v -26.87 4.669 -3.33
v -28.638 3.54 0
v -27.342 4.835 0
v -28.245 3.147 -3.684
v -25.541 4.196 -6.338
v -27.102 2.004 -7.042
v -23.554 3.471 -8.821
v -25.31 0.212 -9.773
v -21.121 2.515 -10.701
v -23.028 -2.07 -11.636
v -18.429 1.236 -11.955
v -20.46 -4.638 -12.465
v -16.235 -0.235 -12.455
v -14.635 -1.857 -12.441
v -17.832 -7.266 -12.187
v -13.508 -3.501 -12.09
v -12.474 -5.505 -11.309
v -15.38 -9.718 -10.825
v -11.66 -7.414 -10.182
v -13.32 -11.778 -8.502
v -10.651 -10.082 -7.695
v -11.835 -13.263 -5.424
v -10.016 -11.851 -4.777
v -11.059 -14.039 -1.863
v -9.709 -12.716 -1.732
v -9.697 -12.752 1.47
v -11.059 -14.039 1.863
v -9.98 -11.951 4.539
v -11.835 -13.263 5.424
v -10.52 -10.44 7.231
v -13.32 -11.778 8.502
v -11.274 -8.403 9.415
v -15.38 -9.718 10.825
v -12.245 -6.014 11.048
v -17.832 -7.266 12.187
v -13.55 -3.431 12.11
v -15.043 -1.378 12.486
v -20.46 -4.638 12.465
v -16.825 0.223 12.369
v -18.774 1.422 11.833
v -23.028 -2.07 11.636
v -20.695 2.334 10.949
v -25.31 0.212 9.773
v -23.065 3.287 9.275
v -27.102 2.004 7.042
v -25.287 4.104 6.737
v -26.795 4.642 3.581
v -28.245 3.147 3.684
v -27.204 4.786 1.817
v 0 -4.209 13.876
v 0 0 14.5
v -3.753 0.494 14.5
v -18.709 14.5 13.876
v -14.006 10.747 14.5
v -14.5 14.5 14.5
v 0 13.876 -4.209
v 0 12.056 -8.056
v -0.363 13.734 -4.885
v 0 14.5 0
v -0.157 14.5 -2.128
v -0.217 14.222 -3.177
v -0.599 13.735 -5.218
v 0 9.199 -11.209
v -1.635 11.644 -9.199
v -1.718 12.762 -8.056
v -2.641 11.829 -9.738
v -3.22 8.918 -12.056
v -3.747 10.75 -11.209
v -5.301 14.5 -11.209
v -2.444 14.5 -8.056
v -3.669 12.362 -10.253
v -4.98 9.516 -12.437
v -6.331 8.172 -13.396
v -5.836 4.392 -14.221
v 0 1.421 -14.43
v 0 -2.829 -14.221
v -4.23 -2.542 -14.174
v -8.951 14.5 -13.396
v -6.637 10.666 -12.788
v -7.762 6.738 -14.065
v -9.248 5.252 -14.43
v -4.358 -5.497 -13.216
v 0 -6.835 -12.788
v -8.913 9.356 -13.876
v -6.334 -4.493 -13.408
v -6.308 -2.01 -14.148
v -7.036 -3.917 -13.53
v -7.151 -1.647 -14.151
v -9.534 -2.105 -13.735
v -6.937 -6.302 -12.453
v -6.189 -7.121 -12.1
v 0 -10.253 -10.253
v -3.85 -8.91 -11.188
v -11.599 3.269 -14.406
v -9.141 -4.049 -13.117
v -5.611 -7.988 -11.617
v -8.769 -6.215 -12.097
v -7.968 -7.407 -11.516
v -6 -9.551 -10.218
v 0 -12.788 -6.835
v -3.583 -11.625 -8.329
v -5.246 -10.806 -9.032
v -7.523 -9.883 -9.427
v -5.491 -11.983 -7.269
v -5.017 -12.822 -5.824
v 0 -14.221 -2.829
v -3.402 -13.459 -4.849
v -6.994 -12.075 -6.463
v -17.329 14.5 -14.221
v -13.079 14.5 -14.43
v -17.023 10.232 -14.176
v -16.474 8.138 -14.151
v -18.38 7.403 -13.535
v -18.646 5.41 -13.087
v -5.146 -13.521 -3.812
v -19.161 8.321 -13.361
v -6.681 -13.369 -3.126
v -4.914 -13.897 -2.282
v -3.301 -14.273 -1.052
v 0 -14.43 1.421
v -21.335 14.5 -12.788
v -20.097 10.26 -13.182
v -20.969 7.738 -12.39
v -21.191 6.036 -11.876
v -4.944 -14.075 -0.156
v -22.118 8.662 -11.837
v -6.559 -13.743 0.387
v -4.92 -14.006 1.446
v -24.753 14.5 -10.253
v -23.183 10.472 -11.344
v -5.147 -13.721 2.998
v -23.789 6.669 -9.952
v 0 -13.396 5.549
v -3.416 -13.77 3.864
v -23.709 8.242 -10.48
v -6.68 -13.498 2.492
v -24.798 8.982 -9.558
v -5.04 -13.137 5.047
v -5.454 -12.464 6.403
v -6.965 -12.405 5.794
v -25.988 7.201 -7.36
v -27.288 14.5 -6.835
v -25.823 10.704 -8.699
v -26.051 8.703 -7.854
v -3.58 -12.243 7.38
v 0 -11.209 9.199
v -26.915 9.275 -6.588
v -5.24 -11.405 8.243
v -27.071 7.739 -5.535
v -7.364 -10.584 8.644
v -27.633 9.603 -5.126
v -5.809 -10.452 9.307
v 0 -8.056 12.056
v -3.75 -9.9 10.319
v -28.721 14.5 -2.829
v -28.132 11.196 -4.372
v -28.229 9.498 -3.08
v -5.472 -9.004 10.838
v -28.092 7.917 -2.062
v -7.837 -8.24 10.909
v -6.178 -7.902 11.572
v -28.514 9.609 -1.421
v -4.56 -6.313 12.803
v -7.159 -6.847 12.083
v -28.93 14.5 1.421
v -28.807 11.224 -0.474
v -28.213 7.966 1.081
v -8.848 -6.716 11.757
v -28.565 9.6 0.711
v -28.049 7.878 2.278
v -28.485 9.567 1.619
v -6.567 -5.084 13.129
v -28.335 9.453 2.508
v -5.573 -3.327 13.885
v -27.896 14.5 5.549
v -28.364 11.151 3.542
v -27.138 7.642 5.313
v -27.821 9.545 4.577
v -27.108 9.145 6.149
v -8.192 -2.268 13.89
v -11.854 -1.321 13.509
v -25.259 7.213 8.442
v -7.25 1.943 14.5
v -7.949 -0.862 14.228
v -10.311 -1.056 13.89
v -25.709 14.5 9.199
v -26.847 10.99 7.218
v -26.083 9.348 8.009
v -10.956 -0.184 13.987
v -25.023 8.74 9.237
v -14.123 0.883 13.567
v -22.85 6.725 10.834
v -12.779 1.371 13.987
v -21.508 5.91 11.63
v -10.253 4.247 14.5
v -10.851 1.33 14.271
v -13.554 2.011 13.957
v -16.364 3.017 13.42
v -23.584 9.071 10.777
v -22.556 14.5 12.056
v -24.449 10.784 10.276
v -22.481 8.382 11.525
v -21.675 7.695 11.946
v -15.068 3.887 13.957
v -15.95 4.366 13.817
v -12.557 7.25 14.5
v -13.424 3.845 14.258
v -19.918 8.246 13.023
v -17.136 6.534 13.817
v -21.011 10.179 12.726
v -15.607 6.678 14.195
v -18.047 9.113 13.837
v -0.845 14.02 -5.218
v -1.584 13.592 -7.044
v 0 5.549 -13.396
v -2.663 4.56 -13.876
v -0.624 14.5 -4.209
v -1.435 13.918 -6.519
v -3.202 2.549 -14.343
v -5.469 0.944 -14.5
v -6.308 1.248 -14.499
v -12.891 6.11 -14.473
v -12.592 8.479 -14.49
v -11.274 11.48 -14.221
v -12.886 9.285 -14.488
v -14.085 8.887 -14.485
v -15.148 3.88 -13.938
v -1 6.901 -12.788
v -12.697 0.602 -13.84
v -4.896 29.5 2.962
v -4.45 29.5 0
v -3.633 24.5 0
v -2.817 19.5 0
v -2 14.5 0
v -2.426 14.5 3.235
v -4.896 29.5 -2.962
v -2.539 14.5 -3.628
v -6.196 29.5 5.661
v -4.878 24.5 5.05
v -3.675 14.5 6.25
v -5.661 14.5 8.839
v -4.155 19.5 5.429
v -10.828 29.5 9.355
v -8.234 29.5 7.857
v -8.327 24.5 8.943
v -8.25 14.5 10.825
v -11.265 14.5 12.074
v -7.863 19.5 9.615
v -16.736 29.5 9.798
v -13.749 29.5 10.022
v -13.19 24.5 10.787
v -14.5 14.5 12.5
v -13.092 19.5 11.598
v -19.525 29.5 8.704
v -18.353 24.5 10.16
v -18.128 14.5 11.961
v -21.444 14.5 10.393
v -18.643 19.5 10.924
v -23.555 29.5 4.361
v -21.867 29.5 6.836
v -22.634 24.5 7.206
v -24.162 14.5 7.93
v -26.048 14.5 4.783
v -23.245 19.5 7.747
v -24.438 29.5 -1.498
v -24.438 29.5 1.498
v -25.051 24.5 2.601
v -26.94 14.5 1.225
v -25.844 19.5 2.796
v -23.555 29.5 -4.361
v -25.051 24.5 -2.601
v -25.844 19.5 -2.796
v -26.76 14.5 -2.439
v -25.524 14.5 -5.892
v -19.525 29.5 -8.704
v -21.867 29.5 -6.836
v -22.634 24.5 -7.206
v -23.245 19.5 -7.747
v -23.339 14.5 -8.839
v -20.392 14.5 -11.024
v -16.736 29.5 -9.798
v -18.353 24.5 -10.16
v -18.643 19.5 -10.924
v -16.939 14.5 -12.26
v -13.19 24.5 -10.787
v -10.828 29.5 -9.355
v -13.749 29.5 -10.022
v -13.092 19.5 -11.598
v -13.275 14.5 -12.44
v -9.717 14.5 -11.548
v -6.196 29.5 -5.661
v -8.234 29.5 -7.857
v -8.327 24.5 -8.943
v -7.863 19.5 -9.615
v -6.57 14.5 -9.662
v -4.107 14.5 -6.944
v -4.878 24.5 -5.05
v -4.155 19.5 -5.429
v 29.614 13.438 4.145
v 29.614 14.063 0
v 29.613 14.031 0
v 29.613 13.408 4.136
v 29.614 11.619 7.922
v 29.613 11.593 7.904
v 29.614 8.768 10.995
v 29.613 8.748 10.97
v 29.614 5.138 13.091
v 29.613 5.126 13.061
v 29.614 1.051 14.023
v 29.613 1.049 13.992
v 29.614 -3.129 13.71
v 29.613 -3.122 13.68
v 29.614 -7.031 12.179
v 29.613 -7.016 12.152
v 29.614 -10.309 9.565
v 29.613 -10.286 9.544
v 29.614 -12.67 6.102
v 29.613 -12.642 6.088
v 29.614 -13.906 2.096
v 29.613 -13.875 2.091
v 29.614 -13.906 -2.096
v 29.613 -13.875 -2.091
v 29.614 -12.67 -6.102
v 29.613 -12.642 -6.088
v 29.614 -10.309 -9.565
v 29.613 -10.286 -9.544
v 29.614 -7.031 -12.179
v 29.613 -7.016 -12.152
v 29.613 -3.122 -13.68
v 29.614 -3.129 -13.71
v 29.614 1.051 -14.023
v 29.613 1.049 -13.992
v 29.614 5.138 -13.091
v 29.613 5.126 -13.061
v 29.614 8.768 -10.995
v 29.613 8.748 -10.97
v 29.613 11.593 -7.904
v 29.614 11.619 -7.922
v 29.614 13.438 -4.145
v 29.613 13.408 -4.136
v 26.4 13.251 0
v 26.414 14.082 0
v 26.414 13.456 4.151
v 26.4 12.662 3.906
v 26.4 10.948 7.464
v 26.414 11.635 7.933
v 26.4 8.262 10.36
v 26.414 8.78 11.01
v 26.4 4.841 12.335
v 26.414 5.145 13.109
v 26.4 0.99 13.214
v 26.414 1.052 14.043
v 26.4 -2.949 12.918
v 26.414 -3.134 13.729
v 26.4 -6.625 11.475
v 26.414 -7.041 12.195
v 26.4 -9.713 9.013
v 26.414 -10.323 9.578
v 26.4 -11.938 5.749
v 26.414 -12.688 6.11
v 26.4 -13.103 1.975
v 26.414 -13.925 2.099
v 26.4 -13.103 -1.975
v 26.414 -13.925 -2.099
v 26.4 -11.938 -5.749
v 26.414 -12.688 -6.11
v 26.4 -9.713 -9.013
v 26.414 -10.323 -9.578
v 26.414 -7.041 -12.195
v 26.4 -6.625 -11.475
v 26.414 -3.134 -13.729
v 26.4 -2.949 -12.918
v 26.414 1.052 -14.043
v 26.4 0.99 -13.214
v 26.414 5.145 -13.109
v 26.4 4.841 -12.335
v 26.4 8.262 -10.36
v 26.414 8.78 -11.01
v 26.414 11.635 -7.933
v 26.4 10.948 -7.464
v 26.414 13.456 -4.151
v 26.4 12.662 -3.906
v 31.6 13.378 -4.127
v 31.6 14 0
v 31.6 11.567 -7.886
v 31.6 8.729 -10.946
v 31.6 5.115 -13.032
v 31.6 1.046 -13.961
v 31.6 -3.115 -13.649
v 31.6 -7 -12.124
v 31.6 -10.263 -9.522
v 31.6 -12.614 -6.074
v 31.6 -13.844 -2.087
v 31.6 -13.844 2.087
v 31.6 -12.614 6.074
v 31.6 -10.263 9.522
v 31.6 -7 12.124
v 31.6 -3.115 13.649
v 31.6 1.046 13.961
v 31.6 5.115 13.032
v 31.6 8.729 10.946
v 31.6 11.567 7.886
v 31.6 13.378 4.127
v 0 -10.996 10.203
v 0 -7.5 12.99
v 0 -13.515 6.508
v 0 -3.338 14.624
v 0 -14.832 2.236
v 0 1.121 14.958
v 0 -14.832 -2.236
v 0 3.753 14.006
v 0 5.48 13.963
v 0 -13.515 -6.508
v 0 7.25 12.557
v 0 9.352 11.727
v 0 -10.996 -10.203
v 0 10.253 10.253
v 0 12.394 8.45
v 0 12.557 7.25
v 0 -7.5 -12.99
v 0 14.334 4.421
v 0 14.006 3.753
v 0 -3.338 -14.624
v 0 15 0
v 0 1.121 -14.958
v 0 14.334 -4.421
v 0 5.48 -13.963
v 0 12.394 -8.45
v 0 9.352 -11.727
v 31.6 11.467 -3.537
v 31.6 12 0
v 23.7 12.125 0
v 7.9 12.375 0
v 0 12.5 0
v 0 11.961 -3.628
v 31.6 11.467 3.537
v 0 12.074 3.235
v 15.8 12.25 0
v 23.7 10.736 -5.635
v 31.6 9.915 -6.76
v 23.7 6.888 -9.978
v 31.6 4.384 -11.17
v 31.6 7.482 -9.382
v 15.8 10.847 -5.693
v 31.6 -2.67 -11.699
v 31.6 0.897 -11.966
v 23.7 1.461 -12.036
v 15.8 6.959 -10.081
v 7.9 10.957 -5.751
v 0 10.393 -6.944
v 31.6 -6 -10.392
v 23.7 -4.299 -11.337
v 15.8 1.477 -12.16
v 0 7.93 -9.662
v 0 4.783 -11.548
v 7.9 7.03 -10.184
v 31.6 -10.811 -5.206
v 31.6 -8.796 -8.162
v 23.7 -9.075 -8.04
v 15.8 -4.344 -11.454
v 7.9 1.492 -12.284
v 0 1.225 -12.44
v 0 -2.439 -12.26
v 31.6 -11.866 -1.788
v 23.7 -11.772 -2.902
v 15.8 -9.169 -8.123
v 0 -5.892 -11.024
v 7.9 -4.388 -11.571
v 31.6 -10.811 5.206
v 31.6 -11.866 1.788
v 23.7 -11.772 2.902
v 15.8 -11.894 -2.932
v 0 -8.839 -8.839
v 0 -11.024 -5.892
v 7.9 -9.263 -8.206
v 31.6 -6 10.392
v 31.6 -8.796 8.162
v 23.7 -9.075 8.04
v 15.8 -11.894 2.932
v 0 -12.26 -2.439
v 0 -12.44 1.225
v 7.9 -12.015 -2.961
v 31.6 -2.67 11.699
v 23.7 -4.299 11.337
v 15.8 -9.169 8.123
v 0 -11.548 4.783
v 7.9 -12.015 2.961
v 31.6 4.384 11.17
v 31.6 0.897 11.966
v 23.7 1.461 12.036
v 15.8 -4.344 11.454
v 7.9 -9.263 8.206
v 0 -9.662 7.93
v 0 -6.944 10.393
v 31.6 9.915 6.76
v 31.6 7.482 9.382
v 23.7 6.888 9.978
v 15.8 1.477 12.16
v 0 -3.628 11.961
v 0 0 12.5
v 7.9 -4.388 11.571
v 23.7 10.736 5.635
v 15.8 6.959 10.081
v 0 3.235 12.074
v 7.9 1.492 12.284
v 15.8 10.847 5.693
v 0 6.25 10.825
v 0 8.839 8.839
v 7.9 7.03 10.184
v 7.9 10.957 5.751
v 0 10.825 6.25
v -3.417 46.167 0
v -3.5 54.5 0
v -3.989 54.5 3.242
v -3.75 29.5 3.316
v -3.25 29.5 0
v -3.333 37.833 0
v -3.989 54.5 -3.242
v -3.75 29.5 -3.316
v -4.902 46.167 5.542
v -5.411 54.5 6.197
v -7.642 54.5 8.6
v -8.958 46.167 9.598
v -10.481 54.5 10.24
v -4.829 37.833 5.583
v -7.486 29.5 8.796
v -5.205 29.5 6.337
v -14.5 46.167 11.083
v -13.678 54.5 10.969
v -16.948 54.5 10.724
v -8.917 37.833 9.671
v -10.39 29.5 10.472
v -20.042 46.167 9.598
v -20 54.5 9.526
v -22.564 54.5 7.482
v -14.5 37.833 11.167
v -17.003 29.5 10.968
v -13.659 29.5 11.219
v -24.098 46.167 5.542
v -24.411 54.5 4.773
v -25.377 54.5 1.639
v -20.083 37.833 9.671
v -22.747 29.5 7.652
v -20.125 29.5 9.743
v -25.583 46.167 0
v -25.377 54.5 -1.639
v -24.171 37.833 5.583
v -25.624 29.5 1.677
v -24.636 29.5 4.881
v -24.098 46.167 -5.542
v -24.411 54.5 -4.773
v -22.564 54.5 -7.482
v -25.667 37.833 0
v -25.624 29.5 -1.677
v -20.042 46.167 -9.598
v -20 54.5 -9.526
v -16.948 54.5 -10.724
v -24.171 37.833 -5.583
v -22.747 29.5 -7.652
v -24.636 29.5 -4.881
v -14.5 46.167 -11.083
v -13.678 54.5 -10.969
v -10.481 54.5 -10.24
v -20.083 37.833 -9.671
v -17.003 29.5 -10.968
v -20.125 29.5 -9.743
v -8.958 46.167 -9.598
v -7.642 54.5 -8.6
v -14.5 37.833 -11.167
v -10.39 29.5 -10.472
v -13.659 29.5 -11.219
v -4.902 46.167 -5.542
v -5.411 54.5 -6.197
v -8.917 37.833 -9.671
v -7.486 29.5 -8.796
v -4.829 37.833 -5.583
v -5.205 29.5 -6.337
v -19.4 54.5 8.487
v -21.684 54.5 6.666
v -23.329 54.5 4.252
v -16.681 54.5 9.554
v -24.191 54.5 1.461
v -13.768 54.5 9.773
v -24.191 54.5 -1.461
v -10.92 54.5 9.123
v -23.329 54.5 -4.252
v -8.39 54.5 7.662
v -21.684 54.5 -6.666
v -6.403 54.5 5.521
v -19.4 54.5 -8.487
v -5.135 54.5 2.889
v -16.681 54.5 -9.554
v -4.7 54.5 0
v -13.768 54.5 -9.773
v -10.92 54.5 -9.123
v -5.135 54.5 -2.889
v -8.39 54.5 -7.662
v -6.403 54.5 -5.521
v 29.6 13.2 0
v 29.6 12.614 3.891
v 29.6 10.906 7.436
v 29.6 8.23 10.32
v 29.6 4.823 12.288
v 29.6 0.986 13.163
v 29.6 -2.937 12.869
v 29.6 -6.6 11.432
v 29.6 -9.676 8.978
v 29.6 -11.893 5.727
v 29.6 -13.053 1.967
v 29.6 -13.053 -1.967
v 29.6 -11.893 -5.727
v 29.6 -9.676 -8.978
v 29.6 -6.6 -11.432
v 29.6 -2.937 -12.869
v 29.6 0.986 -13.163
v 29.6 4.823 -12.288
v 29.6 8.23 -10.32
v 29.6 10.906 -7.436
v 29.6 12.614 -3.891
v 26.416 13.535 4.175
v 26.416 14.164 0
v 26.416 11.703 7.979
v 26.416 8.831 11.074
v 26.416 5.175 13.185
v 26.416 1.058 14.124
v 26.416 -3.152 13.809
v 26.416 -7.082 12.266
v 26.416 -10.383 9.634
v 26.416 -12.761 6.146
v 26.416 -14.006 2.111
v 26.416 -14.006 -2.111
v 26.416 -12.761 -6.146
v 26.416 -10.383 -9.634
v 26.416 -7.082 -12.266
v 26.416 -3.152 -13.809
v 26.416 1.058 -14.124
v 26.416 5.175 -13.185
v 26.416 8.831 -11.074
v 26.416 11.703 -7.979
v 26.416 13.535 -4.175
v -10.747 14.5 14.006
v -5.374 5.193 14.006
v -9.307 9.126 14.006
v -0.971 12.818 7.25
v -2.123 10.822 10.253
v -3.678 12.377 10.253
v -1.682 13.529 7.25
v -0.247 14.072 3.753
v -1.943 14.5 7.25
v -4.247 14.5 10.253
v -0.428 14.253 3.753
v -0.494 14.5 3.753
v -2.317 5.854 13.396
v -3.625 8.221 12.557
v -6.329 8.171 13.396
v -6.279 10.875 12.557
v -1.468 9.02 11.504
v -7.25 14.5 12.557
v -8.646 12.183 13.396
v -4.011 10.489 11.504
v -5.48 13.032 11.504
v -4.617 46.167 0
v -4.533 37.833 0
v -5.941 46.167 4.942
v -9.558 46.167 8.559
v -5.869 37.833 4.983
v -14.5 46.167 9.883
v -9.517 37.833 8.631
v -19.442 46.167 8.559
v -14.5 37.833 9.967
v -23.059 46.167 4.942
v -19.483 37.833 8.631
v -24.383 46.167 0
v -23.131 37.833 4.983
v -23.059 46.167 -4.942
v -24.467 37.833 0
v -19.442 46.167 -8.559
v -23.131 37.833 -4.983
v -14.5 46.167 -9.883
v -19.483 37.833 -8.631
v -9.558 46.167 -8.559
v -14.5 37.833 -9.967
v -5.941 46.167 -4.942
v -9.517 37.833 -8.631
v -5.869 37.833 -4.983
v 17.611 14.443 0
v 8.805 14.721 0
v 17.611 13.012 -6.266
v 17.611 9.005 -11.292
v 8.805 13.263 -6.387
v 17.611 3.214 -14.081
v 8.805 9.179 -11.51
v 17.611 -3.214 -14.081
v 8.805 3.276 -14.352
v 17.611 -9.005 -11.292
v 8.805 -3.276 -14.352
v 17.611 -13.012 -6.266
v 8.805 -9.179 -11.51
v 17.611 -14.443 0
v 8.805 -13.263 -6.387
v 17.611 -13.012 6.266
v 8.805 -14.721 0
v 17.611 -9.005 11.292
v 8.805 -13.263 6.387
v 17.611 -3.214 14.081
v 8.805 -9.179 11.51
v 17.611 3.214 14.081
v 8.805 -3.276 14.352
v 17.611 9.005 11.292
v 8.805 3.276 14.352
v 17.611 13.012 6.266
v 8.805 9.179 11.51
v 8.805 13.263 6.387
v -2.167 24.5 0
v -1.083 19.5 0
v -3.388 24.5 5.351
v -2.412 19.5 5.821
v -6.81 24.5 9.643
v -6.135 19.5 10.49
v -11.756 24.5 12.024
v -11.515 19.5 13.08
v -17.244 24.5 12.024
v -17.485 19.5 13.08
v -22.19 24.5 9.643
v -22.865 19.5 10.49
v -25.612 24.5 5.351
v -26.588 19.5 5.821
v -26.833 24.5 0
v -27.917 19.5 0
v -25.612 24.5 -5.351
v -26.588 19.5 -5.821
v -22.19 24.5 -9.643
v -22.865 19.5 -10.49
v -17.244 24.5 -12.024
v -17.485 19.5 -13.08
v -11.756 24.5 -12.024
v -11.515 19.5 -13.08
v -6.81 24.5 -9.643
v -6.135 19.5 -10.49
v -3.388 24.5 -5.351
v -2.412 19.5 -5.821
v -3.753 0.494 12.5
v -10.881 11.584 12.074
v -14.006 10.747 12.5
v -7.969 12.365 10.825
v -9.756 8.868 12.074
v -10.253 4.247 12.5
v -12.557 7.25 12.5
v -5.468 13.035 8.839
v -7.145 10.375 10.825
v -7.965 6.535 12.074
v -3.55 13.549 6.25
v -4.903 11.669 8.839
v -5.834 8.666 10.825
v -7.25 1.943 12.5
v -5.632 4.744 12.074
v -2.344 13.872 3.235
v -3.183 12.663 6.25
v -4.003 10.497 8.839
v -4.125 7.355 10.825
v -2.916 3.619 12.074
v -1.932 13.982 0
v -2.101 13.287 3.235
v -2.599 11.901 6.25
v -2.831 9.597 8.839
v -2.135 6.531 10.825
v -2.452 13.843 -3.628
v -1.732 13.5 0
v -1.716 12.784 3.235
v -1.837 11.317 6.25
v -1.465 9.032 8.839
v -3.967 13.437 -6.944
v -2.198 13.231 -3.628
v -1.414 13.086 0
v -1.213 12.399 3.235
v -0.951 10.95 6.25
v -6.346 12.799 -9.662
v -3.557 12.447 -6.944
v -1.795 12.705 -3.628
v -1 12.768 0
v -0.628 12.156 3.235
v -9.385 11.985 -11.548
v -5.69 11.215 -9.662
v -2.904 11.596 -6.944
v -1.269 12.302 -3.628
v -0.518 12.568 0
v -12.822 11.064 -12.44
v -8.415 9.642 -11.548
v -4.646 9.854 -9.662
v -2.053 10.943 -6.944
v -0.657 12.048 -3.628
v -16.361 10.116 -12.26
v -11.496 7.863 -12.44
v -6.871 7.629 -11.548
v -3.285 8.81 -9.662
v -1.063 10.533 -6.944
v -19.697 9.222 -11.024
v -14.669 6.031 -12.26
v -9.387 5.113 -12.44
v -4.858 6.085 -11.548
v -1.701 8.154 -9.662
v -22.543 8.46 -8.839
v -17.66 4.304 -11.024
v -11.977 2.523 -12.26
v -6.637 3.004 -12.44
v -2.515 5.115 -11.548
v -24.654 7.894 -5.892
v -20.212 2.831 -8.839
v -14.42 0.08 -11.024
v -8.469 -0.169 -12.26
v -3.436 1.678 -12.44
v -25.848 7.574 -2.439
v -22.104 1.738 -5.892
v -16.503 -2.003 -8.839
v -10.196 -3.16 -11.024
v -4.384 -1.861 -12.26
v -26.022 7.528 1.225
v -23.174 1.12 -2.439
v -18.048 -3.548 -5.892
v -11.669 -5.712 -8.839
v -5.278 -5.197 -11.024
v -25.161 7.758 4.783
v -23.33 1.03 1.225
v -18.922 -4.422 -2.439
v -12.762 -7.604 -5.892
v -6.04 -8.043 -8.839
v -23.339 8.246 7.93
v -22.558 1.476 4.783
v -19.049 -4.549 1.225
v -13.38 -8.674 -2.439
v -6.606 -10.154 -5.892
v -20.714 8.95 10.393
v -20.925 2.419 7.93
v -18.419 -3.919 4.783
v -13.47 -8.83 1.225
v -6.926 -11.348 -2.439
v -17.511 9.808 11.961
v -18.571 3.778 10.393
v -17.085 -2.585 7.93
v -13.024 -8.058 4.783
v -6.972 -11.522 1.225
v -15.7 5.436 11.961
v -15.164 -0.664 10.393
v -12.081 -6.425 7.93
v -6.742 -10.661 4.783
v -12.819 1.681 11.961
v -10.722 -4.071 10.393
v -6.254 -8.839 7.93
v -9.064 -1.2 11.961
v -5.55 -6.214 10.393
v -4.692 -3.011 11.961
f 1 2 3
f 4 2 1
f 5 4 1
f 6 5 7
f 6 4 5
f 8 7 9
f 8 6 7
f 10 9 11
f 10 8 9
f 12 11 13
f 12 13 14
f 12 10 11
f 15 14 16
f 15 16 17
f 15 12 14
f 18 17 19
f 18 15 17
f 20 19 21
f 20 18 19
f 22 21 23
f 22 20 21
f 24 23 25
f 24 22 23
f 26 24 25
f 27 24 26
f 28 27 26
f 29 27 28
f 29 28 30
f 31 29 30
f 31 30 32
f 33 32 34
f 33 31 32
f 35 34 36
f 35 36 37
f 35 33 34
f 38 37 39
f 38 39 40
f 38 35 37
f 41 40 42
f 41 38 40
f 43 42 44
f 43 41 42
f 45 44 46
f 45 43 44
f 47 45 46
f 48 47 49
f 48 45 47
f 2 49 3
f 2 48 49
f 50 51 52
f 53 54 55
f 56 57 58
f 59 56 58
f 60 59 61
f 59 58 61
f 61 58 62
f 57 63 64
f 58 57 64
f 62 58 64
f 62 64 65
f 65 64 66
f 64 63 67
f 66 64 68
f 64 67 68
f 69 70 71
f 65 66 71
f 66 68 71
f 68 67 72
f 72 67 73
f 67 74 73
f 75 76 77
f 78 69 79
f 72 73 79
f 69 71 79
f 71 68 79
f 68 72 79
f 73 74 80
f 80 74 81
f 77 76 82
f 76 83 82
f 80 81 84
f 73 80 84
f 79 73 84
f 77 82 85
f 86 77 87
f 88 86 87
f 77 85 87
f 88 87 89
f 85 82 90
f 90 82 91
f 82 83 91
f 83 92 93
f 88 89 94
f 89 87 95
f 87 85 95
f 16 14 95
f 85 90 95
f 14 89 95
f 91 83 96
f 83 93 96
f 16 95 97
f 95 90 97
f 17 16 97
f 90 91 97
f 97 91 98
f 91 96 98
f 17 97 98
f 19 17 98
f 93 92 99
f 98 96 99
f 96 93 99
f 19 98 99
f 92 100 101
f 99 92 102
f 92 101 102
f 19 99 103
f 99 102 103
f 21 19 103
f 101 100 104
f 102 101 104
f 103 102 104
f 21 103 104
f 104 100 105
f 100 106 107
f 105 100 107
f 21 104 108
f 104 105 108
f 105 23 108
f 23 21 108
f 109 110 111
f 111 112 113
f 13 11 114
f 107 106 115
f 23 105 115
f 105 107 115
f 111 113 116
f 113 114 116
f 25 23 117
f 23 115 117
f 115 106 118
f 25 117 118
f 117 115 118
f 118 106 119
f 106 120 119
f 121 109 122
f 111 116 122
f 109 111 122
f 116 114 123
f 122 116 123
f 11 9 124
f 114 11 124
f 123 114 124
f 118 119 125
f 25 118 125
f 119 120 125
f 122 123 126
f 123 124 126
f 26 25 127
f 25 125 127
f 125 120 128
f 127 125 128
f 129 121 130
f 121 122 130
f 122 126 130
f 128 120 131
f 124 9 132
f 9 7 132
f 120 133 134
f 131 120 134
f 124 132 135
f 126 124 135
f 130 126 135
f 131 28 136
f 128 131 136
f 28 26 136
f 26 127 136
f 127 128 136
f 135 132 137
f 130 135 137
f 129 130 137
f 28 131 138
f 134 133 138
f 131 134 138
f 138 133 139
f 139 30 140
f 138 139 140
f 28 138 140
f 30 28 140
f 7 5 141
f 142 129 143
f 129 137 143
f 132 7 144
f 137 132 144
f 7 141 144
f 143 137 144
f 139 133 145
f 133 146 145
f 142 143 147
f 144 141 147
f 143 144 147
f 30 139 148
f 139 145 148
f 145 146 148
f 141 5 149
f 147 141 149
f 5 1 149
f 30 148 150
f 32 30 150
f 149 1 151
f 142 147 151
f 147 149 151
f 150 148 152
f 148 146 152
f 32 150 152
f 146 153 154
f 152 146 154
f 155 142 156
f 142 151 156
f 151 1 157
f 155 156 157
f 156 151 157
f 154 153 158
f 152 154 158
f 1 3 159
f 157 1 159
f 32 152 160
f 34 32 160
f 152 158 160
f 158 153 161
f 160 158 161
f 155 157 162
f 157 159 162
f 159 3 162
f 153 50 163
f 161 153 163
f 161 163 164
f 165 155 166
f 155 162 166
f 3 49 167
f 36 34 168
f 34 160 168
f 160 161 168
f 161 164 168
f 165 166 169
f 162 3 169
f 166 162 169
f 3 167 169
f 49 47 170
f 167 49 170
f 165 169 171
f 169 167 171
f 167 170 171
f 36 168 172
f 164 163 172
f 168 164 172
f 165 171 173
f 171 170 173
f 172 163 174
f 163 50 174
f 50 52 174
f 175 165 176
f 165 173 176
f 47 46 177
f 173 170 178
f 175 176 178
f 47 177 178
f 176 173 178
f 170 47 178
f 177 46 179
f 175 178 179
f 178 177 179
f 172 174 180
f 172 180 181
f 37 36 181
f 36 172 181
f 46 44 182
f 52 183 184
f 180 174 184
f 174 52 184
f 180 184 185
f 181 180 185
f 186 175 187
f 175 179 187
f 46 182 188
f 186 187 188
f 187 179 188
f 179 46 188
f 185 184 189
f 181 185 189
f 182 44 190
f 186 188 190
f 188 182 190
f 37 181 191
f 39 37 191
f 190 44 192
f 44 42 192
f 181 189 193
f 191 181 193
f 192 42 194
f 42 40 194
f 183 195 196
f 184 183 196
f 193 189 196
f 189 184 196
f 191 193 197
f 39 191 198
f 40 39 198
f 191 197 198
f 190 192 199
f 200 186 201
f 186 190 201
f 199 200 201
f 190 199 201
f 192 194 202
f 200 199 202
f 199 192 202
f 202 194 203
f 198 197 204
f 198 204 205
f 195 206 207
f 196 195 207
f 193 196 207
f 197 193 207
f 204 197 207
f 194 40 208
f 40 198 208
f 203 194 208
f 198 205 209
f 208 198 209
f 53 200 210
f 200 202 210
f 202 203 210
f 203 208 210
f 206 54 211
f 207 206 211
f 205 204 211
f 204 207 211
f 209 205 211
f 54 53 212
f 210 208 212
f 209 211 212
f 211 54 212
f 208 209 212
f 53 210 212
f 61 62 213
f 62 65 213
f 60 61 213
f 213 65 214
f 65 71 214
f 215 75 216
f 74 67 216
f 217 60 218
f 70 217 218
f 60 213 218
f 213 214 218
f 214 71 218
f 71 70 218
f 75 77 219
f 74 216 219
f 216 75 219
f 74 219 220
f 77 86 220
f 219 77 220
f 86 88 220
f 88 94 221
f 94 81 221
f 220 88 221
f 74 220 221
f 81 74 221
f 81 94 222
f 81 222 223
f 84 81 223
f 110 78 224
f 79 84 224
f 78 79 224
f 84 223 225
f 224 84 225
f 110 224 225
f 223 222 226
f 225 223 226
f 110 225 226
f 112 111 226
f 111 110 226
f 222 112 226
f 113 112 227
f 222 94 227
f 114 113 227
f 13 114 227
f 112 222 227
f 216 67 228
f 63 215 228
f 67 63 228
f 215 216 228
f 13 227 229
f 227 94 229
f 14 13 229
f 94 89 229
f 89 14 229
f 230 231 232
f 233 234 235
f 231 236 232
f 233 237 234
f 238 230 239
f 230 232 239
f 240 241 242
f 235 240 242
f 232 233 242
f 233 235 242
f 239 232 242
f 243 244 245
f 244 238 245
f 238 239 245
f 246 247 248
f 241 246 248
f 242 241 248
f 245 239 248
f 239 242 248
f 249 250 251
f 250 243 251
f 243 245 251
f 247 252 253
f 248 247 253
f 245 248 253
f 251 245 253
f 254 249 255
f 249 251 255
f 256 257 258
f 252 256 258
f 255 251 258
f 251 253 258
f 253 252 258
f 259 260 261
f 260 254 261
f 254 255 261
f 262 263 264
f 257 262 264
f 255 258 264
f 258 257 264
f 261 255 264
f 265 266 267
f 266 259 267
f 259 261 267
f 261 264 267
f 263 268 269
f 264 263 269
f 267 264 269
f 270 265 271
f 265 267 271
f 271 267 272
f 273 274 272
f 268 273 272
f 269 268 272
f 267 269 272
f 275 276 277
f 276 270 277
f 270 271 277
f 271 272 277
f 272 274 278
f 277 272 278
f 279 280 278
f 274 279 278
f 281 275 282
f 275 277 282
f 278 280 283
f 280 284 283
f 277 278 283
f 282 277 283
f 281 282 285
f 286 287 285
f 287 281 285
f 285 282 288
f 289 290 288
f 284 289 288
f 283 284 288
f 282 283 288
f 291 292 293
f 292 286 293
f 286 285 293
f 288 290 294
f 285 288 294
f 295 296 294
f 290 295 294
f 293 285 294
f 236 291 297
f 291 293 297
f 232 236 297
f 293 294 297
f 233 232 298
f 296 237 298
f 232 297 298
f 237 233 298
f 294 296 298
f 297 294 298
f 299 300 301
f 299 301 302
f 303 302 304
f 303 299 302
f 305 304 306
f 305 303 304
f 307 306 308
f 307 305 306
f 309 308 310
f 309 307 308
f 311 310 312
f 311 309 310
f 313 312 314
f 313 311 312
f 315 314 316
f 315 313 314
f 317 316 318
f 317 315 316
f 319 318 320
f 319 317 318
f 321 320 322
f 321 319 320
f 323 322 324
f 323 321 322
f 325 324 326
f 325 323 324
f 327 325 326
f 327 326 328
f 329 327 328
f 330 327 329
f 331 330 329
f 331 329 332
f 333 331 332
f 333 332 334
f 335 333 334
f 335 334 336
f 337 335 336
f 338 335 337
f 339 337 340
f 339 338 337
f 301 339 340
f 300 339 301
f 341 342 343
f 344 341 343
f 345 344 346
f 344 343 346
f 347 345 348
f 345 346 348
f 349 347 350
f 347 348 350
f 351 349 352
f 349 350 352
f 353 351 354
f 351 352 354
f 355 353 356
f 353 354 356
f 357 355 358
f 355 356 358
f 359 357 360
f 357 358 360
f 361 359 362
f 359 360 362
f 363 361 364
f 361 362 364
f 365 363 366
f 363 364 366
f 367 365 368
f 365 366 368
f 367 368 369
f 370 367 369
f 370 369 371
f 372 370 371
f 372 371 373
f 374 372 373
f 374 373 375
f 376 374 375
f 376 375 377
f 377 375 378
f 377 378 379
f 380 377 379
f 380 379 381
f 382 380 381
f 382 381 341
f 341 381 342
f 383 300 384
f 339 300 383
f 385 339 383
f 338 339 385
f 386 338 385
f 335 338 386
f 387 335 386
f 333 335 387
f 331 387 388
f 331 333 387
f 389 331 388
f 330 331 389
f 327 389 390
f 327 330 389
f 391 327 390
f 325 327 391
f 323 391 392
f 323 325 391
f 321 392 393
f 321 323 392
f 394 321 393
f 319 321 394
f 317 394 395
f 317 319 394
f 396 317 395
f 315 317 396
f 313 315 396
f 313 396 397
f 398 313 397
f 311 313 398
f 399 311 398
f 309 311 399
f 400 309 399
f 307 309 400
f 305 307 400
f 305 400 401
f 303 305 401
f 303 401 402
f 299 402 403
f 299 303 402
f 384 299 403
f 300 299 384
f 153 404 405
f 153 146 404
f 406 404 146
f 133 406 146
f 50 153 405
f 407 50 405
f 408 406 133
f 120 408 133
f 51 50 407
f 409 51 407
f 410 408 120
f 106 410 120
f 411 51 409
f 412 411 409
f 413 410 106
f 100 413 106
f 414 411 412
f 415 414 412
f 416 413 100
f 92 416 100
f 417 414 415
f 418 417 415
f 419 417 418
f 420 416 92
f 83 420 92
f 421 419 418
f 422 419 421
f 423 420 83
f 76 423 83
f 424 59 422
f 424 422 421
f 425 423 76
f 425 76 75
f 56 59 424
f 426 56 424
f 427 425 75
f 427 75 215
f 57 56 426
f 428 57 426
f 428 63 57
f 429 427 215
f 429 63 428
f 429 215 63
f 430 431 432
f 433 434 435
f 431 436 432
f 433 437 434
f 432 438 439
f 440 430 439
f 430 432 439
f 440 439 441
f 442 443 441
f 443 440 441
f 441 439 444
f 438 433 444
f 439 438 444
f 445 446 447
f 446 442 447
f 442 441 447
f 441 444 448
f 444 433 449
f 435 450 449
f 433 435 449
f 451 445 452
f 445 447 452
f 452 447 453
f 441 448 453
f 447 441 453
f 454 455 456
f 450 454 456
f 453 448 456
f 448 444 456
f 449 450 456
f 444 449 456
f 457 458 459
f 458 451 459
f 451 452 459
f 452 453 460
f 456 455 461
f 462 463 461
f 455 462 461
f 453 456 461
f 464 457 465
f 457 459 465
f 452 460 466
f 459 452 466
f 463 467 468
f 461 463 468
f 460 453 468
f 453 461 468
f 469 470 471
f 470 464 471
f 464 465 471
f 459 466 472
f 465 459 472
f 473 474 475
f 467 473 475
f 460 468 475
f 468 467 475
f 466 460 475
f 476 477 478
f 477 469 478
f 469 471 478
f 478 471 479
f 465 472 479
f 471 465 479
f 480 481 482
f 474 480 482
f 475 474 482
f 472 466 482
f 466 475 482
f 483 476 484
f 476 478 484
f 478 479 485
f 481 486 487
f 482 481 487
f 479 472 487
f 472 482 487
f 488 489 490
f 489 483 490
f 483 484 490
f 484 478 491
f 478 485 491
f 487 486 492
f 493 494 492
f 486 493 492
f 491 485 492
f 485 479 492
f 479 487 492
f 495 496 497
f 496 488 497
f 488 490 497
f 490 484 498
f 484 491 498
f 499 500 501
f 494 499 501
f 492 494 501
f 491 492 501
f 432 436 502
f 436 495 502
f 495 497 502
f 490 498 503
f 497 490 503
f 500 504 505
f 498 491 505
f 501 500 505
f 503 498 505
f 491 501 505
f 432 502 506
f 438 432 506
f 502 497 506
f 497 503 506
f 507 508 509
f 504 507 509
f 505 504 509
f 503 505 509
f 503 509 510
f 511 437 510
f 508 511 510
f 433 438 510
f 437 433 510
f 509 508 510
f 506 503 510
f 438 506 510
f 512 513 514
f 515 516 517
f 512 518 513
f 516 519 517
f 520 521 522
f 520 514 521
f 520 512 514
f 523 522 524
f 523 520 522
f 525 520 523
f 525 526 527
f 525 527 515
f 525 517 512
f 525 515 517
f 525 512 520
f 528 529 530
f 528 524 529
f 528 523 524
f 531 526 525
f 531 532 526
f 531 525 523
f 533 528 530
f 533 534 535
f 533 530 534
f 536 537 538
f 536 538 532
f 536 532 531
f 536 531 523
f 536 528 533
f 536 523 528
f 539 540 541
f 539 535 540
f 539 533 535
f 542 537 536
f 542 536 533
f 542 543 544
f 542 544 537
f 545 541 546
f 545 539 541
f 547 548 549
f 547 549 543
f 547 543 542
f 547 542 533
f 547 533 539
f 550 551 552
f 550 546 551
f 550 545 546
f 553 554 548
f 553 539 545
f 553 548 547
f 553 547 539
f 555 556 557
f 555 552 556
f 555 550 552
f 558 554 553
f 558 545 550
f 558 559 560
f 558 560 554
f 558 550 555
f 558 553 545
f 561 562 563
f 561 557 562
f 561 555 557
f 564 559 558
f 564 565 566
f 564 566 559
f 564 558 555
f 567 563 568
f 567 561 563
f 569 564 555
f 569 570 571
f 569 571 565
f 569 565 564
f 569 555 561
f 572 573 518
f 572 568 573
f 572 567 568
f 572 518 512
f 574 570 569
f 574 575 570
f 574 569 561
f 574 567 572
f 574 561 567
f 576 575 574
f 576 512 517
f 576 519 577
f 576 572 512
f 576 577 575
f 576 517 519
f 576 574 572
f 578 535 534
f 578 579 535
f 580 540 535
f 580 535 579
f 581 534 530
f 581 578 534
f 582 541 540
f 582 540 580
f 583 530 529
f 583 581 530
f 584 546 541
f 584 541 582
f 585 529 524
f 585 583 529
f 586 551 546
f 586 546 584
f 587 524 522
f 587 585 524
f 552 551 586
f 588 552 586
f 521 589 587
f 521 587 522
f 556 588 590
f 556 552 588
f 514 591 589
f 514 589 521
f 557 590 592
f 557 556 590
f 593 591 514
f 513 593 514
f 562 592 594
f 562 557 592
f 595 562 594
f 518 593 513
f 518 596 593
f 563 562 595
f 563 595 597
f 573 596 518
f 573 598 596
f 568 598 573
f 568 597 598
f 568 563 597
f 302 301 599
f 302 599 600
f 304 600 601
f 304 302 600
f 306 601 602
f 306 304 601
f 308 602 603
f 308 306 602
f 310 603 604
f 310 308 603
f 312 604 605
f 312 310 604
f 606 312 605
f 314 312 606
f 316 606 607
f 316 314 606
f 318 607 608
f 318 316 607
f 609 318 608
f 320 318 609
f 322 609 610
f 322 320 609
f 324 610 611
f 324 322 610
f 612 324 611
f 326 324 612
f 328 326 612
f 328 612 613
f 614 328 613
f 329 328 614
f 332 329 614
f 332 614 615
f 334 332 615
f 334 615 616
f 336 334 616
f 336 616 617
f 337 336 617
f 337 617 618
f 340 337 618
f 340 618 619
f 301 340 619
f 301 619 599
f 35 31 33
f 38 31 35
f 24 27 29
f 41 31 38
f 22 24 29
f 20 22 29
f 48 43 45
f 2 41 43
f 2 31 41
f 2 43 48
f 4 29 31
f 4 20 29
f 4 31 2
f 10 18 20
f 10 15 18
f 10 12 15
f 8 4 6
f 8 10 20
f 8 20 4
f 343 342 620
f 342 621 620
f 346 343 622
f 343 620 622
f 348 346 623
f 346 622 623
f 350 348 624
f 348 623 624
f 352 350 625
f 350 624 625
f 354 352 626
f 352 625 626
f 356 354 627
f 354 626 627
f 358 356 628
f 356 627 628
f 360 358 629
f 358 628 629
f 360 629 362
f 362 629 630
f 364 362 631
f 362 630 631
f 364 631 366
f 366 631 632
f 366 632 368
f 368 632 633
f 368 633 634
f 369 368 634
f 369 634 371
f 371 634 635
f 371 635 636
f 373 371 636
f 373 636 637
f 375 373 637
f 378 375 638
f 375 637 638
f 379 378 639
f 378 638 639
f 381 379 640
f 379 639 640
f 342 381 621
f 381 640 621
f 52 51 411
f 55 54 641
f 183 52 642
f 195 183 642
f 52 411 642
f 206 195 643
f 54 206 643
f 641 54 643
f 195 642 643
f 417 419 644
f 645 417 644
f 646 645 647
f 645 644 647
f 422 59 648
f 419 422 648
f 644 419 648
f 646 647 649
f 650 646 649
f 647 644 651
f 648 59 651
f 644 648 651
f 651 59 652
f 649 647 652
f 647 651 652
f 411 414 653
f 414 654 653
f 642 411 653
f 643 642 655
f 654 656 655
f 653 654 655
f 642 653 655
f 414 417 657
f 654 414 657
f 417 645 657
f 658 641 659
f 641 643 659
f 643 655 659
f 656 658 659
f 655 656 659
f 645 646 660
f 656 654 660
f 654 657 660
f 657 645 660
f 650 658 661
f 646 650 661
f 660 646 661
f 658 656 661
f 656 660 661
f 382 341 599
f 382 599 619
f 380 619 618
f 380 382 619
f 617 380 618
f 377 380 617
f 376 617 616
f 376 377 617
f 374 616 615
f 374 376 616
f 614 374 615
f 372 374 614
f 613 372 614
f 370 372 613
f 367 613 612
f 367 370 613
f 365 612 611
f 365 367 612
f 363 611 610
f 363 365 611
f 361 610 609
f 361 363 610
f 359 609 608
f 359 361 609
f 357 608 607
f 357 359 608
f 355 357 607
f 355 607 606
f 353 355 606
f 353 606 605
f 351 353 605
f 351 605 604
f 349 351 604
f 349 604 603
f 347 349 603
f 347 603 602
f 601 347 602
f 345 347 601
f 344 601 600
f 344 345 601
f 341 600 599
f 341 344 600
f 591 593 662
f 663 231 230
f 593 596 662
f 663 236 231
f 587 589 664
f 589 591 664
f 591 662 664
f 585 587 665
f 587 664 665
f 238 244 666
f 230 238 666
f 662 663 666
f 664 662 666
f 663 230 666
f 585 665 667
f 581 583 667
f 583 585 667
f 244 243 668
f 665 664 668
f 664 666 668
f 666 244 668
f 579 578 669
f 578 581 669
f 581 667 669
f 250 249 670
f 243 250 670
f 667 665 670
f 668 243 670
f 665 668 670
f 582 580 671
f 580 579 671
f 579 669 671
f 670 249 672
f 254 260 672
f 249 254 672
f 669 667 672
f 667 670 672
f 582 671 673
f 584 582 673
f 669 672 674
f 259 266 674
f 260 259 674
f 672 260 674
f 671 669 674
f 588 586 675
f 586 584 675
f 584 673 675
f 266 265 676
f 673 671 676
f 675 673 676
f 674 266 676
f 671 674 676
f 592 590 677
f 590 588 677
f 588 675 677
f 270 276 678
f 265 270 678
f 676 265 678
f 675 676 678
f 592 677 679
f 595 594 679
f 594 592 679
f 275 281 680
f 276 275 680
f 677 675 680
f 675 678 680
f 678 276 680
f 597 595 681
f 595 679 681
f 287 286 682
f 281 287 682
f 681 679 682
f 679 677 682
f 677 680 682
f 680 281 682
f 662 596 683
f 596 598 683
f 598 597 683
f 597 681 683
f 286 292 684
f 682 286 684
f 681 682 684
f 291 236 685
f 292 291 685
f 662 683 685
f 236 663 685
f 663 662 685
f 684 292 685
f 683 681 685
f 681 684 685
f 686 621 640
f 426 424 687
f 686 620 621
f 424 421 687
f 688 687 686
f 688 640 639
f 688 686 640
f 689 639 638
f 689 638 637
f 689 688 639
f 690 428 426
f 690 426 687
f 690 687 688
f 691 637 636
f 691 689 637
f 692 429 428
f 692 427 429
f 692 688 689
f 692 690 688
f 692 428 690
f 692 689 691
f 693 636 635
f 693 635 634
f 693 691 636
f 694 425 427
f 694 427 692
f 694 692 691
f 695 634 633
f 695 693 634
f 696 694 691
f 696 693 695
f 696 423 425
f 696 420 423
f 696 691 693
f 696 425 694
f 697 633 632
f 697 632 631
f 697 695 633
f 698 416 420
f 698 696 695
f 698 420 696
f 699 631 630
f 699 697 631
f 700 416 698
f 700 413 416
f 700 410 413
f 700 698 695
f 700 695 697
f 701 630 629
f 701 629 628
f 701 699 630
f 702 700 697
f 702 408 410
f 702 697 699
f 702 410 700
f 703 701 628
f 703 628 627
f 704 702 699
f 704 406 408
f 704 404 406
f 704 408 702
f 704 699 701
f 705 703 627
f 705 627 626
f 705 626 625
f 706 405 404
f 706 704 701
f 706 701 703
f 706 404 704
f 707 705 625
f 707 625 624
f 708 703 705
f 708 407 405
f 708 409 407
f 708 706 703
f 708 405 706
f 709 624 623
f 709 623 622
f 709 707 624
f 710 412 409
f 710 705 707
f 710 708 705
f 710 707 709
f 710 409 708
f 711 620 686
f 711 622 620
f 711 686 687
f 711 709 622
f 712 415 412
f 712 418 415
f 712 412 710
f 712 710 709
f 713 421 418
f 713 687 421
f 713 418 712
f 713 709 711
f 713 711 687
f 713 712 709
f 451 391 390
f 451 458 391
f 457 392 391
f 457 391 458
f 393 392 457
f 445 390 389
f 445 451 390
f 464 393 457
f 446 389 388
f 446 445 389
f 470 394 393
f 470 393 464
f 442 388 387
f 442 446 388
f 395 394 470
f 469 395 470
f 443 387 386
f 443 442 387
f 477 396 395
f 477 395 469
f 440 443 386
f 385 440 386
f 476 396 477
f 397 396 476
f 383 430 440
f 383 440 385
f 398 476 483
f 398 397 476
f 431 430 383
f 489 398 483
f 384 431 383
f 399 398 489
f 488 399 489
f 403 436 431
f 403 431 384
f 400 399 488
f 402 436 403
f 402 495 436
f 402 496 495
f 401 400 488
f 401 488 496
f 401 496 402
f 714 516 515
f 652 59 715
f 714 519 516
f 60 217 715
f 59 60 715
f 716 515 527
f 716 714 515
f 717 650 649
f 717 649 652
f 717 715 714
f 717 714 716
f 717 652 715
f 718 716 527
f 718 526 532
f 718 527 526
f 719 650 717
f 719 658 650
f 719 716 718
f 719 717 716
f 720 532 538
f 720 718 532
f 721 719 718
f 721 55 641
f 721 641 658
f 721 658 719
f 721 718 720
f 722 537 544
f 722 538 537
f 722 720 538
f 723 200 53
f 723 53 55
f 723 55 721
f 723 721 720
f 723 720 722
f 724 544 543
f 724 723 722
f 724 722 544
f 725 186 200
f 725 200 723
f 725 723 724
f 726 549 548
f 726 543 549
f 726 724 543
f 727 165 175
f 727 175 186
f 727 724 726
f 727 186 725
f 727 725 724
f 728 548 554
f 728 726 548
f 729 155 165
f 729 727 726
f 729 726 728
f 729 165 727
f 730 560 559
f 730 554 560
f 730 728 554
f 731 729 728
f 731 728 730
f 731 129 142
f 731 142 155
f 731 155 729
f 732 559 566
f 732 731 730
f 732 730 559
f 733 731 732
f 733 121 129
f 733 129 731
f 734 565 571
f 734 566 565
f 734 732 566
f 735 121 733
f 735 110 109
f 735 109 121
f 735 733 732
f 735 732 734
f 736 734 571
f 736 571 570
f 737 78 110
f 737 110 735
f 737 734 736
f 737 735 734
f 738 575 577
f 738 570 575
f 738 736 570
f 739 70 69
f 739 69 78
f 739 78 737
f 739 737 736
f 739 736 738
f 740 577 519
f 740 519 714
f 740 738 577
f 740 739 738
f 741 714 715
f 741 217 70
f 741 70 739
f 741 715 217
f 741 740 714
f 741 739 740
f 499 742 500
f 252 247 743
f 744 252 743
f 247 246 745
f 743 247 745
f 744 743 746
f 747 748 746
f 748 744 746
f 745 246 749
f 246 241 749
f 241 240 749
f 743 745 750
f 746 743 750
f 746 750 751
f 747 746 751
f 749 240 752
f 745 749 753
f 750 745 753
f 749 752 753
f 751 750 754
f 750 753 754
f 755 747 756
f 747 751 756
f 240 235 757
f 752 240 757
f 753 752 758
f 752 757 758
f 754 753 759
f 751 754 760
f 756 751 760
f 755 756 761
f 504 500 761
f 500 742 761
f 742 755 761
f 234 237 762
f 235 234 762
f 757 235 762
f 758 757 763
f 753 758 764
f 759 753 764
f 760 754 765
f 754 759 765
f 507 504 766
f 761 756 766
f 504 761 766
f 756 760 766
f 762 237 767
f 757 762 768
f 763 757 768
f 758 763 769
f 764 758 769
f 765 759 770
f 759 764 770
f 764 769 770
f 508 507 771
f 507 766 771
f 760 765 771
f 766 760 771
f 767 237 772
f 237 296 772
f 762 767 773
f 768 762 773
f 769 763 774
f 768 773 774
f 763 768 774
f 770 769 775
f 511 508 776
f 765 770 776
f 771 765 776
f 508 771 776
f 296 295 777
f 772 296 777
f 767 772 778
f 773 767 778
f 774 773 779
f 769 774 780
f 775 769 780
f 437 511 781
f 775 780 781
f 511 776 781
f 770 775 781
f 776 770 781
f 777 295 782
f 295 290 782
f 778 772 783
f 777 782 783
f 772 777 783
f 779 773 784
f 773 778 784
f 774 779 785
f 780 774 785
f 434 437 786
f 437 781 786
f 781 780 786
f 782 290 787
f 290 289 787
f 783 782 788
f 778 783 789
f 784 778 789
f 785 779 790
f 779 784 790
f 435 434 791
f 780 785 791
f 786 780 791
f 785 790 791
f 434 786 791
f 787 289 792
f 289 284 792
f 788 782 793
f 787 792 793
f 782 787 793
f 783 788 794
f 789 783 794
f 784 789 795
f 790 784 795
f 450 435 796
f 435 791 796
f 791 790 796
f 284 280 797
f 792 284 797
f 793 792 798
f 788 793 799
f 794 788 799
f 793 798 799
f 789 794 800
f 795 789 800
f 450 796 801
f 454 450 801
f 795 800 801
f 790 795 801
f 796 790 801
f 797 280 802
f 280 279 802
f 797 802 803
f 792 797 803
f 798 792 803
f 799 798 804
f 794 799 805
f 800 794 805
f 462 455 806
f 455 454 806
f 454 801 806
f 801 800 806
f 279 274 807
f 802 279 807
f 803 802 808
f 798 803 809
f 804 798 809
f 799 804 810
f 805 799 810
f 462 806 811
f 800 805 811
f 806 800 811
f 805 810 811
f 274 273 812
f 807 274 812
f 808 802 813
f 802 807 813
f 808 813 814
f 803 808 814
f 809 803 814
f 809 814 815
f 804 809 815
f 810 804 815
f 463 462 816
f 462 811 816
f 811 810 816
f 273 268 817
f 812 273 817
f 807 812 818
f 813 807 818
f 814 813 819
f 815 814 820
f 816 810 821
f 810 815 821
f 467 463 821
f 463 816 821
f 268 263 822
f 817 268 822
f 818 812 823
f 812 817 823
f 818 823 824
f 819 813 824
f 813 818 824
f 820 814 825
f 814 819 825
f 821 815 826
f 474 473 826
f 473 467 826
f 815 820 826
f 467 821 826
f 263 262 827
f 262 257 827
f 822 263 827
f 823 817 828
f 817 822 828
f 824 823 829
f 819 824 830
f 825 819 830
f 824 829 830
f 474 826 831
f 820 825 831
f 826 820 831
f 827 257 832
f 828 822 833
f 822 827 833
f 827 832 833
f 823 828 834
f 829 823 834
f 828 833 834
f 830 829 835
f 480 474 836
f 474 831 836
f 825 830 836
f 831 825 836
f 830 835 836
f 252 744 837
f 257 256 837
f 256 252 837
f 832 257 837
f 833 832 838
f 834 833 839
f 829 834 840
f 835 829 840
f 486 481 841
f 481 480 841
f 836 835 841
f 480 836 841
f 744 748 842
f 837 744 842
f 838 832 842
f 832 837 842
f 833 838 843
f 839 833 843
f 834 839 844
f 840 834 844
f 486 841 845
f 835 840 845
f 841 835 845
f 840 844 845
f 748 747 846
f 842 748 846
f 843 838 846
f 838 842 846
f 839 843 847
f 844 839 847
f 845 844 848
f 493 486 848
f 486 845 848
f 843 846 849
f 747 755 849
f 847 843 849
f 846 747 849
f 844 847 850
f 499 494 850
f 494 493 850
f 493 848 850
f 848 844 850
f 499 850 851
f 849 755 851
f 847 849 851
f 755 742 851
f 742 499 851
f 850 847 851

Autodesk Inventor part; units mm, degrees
ref_plane "YZ Plane" through (0, 0, 0) normal (1, 0, 0) x (0, 1, 0)
sketch "Sketch1" plane through (0, 0, 0) normal (0, 0, 1) x (1, 0, 0)
  line L0 (0, 0) -> (0, 14.5) construction
  line L1 (0, 0) -> (31.6, 0) construction
  line L2 (31.6, 0) -> (31.6, 14) construction
  line L3 (0, 12.4997) -> (31.6, 11.9997)
  line L4 (0, 12.4997) -> (0, 14.5)
  line L5 (31.6, 14) -> (31.6, 11.9997)
  line L6 (29.6, 0) -> (29.6, 13.2) construction
  line L7 (29.6, 13.2) -> (29.6132, 14.0314)
  line L8 (29.6, 13.2) -> (26.4004, 13.2506)
  line L9 (26.4004, 13.2506) -> (26.4136, 14.0821)
  line L10 (31.6, 14) -> (29.6132, 14.0314)
  line L11 (26.4136, 14.0821) -> (0, 14.5)
  dimension "d0" = 14.5
  dimension "d1" = 31.6
  dimension "d2" = 14
  dimension "d4" = 13.2
  dimension "d5" = 2
  dimension "d6" = 3.2
  dimension "d22" = 2
revolve "Revolution1" add sketch "Sketch1" angle 360 about axis through (0, 0, 0) along (1, 0, 0)
ref_plane "Work Plane1" through (0, 14.5, 0) normal (0, 1, 0) x (-1, 0, 0)
sketch "Sketch2" plane through (0, 14.5, 0) normal (0, 1, 0) x (-1, 0, 0)
  line L0 (0, 14.5) -> (0, -14.5) construction
  line L1 (0, 14.5) -> (0, -14.5) construction
  point P0 (0, 0)
sketch "Sketch3" plane through (0, 0, 0) normal (-1, 0, 0) x (0, 0, 1)
  circle A0 centre (0, 0) radius 14.5 projected
  circle A1 centre (0, 0) radius 12.4997 projected
revolve "Revolution2" add sketch "Sketch3" angle 90 about axis through (0, 14.5, 14.5) along (0, 0, -1)
sketch "Sketch4" plane through (0, 0, 0) normal (0, 0, 1) x (1, 0, 0)
  line L0 (0, 14.5) -> (-29, 14.5) construction
  line L1 (-14.5, 14.5) -> (0, 14.5) construction
  line L2 (0, 14.5) -> (26.4136, 14.0821) construction
  line L3 (-14.5, 14.5) -> (-14.5, 29.5) construction
  line L4 (-14.5, 29.5) -> (-3.25, 29.5) construction
  line L5 (-3.25, 29.5) -> (0, 14.5)
  line L6 (-14.5, 29.5) -> (-14.5, 54.5) construction
  line L7 (-14.5, 54.5) -> (-3.5, 54.5) construction
  line L8 (-3.5, 54.5) -> (-3.25, 29.5)
  line L9 (-3.5, 54.5) -> (-4.7, 54.5)
  line L10 (-4.7, 54.5) -> (-4.45, 29.5)
  line L11 (-4.45, 29.5) -> (-2.0003, 14.5)
  line L12 (-2.0003, 14.5) -> (0, 14.5)
  line L13 (-26.9997, 14.5) -> (-2.0003, 14.5) projected
  point P0 (0, 0)
  dimension "d10" = 15
  dimension "d11" = 11.25
  dimension "d12" = 25
  dimension "d13" = 11
  dimension "d14" = 1.2
  dimension "d15" = 1.2
revolve "Revolution3" add sketch "Sketch4" angle 360 about axis through (-14.5, 29.5, 0) along (0, 1, 0)
ref_plane "Work Plane3" through (-19.799, -5.299, 14.5) normal (-0.7071068, -0.7071068, 0) x (0, 0, -1)
ref_plane "Work Plane2" through (0, 14.5, 14.5) normal (-0.7071068, -0.7071068, 0) x (0, 0, -1)
sketch "Sketch5" plane through (-19.799, -5.299, 14.5) normal (-0.7071068, -0.7071068, 0) x (0, 0, -1)
  circle A0 centre (14.5, 0) radius 14.5
  point P0 (14.5, 10.253)
extrude "Extrusion1" cut sketch "Sketch5" along normal blind 10
sketch "Sketch6" plane through (-19.799, -5.299, 14.5) normal (-0.7071068, -0.7071068, 0) x (-0.7071068, 0.7071068, 0)
  ellipse E0 centre (-10.253, 14.5) end of major axis (-10.253, 29) minor radius 10.253 projected
  circle A0 centre (0, 14.5) radius 12.5
  dimension "d23" = 25
extrude "Extrusion2" add sketch "Sketch6" against normal up to next contours A0 E0 | E0 A0 picked at (-4.1364, 16.63) picked at (3.9536, 16.6096)
sketch "Sketch7" plane through (0, 0, 0) normal (0, 0, 1) x (1, 0, 0)
  line L0 (0, 0) -> (0, 15) construction
  line L1 (0, -14.5) -> (0, 14.5) projected
  line L2 (0, 14.5) -> (0, 15)
  line L3 (31.6, -14) -> (31.6, 14) projected
  line L4 (0, 15) -> (31.6, 14)
  line L5 (26.4136, -14.0821) -> (26.4136, 14.0821) projected
  line L6 (26.4136, 14.0821) -> (26.4162, 14.164)
  line L7 (29.6132, -14.0314) -> (29.6132, 14.0314) projected
  line L8 (29.6132, 14.0314) -> (29.6141, 14.0628)
  line L9 (0, 14.5) -> (26.4136, 14.0821)
  line L10 (29.6132, 14.0314) -> (31.6, 14)
  line L11 (31.6, -11.9997) -> (31.6, 11.9997) projected
  line L12 (31.6, 0) -> (0, 0)
  dimension "d26" = 15
revolve "Revolution4" add sketch "Sketch7" angle 360 about axis through (31.6, 0, 0) along (-1, 0, 0) contours L2 L4 L6 L9 | L8 L4 L10
properties part number "90DegreeV3"
